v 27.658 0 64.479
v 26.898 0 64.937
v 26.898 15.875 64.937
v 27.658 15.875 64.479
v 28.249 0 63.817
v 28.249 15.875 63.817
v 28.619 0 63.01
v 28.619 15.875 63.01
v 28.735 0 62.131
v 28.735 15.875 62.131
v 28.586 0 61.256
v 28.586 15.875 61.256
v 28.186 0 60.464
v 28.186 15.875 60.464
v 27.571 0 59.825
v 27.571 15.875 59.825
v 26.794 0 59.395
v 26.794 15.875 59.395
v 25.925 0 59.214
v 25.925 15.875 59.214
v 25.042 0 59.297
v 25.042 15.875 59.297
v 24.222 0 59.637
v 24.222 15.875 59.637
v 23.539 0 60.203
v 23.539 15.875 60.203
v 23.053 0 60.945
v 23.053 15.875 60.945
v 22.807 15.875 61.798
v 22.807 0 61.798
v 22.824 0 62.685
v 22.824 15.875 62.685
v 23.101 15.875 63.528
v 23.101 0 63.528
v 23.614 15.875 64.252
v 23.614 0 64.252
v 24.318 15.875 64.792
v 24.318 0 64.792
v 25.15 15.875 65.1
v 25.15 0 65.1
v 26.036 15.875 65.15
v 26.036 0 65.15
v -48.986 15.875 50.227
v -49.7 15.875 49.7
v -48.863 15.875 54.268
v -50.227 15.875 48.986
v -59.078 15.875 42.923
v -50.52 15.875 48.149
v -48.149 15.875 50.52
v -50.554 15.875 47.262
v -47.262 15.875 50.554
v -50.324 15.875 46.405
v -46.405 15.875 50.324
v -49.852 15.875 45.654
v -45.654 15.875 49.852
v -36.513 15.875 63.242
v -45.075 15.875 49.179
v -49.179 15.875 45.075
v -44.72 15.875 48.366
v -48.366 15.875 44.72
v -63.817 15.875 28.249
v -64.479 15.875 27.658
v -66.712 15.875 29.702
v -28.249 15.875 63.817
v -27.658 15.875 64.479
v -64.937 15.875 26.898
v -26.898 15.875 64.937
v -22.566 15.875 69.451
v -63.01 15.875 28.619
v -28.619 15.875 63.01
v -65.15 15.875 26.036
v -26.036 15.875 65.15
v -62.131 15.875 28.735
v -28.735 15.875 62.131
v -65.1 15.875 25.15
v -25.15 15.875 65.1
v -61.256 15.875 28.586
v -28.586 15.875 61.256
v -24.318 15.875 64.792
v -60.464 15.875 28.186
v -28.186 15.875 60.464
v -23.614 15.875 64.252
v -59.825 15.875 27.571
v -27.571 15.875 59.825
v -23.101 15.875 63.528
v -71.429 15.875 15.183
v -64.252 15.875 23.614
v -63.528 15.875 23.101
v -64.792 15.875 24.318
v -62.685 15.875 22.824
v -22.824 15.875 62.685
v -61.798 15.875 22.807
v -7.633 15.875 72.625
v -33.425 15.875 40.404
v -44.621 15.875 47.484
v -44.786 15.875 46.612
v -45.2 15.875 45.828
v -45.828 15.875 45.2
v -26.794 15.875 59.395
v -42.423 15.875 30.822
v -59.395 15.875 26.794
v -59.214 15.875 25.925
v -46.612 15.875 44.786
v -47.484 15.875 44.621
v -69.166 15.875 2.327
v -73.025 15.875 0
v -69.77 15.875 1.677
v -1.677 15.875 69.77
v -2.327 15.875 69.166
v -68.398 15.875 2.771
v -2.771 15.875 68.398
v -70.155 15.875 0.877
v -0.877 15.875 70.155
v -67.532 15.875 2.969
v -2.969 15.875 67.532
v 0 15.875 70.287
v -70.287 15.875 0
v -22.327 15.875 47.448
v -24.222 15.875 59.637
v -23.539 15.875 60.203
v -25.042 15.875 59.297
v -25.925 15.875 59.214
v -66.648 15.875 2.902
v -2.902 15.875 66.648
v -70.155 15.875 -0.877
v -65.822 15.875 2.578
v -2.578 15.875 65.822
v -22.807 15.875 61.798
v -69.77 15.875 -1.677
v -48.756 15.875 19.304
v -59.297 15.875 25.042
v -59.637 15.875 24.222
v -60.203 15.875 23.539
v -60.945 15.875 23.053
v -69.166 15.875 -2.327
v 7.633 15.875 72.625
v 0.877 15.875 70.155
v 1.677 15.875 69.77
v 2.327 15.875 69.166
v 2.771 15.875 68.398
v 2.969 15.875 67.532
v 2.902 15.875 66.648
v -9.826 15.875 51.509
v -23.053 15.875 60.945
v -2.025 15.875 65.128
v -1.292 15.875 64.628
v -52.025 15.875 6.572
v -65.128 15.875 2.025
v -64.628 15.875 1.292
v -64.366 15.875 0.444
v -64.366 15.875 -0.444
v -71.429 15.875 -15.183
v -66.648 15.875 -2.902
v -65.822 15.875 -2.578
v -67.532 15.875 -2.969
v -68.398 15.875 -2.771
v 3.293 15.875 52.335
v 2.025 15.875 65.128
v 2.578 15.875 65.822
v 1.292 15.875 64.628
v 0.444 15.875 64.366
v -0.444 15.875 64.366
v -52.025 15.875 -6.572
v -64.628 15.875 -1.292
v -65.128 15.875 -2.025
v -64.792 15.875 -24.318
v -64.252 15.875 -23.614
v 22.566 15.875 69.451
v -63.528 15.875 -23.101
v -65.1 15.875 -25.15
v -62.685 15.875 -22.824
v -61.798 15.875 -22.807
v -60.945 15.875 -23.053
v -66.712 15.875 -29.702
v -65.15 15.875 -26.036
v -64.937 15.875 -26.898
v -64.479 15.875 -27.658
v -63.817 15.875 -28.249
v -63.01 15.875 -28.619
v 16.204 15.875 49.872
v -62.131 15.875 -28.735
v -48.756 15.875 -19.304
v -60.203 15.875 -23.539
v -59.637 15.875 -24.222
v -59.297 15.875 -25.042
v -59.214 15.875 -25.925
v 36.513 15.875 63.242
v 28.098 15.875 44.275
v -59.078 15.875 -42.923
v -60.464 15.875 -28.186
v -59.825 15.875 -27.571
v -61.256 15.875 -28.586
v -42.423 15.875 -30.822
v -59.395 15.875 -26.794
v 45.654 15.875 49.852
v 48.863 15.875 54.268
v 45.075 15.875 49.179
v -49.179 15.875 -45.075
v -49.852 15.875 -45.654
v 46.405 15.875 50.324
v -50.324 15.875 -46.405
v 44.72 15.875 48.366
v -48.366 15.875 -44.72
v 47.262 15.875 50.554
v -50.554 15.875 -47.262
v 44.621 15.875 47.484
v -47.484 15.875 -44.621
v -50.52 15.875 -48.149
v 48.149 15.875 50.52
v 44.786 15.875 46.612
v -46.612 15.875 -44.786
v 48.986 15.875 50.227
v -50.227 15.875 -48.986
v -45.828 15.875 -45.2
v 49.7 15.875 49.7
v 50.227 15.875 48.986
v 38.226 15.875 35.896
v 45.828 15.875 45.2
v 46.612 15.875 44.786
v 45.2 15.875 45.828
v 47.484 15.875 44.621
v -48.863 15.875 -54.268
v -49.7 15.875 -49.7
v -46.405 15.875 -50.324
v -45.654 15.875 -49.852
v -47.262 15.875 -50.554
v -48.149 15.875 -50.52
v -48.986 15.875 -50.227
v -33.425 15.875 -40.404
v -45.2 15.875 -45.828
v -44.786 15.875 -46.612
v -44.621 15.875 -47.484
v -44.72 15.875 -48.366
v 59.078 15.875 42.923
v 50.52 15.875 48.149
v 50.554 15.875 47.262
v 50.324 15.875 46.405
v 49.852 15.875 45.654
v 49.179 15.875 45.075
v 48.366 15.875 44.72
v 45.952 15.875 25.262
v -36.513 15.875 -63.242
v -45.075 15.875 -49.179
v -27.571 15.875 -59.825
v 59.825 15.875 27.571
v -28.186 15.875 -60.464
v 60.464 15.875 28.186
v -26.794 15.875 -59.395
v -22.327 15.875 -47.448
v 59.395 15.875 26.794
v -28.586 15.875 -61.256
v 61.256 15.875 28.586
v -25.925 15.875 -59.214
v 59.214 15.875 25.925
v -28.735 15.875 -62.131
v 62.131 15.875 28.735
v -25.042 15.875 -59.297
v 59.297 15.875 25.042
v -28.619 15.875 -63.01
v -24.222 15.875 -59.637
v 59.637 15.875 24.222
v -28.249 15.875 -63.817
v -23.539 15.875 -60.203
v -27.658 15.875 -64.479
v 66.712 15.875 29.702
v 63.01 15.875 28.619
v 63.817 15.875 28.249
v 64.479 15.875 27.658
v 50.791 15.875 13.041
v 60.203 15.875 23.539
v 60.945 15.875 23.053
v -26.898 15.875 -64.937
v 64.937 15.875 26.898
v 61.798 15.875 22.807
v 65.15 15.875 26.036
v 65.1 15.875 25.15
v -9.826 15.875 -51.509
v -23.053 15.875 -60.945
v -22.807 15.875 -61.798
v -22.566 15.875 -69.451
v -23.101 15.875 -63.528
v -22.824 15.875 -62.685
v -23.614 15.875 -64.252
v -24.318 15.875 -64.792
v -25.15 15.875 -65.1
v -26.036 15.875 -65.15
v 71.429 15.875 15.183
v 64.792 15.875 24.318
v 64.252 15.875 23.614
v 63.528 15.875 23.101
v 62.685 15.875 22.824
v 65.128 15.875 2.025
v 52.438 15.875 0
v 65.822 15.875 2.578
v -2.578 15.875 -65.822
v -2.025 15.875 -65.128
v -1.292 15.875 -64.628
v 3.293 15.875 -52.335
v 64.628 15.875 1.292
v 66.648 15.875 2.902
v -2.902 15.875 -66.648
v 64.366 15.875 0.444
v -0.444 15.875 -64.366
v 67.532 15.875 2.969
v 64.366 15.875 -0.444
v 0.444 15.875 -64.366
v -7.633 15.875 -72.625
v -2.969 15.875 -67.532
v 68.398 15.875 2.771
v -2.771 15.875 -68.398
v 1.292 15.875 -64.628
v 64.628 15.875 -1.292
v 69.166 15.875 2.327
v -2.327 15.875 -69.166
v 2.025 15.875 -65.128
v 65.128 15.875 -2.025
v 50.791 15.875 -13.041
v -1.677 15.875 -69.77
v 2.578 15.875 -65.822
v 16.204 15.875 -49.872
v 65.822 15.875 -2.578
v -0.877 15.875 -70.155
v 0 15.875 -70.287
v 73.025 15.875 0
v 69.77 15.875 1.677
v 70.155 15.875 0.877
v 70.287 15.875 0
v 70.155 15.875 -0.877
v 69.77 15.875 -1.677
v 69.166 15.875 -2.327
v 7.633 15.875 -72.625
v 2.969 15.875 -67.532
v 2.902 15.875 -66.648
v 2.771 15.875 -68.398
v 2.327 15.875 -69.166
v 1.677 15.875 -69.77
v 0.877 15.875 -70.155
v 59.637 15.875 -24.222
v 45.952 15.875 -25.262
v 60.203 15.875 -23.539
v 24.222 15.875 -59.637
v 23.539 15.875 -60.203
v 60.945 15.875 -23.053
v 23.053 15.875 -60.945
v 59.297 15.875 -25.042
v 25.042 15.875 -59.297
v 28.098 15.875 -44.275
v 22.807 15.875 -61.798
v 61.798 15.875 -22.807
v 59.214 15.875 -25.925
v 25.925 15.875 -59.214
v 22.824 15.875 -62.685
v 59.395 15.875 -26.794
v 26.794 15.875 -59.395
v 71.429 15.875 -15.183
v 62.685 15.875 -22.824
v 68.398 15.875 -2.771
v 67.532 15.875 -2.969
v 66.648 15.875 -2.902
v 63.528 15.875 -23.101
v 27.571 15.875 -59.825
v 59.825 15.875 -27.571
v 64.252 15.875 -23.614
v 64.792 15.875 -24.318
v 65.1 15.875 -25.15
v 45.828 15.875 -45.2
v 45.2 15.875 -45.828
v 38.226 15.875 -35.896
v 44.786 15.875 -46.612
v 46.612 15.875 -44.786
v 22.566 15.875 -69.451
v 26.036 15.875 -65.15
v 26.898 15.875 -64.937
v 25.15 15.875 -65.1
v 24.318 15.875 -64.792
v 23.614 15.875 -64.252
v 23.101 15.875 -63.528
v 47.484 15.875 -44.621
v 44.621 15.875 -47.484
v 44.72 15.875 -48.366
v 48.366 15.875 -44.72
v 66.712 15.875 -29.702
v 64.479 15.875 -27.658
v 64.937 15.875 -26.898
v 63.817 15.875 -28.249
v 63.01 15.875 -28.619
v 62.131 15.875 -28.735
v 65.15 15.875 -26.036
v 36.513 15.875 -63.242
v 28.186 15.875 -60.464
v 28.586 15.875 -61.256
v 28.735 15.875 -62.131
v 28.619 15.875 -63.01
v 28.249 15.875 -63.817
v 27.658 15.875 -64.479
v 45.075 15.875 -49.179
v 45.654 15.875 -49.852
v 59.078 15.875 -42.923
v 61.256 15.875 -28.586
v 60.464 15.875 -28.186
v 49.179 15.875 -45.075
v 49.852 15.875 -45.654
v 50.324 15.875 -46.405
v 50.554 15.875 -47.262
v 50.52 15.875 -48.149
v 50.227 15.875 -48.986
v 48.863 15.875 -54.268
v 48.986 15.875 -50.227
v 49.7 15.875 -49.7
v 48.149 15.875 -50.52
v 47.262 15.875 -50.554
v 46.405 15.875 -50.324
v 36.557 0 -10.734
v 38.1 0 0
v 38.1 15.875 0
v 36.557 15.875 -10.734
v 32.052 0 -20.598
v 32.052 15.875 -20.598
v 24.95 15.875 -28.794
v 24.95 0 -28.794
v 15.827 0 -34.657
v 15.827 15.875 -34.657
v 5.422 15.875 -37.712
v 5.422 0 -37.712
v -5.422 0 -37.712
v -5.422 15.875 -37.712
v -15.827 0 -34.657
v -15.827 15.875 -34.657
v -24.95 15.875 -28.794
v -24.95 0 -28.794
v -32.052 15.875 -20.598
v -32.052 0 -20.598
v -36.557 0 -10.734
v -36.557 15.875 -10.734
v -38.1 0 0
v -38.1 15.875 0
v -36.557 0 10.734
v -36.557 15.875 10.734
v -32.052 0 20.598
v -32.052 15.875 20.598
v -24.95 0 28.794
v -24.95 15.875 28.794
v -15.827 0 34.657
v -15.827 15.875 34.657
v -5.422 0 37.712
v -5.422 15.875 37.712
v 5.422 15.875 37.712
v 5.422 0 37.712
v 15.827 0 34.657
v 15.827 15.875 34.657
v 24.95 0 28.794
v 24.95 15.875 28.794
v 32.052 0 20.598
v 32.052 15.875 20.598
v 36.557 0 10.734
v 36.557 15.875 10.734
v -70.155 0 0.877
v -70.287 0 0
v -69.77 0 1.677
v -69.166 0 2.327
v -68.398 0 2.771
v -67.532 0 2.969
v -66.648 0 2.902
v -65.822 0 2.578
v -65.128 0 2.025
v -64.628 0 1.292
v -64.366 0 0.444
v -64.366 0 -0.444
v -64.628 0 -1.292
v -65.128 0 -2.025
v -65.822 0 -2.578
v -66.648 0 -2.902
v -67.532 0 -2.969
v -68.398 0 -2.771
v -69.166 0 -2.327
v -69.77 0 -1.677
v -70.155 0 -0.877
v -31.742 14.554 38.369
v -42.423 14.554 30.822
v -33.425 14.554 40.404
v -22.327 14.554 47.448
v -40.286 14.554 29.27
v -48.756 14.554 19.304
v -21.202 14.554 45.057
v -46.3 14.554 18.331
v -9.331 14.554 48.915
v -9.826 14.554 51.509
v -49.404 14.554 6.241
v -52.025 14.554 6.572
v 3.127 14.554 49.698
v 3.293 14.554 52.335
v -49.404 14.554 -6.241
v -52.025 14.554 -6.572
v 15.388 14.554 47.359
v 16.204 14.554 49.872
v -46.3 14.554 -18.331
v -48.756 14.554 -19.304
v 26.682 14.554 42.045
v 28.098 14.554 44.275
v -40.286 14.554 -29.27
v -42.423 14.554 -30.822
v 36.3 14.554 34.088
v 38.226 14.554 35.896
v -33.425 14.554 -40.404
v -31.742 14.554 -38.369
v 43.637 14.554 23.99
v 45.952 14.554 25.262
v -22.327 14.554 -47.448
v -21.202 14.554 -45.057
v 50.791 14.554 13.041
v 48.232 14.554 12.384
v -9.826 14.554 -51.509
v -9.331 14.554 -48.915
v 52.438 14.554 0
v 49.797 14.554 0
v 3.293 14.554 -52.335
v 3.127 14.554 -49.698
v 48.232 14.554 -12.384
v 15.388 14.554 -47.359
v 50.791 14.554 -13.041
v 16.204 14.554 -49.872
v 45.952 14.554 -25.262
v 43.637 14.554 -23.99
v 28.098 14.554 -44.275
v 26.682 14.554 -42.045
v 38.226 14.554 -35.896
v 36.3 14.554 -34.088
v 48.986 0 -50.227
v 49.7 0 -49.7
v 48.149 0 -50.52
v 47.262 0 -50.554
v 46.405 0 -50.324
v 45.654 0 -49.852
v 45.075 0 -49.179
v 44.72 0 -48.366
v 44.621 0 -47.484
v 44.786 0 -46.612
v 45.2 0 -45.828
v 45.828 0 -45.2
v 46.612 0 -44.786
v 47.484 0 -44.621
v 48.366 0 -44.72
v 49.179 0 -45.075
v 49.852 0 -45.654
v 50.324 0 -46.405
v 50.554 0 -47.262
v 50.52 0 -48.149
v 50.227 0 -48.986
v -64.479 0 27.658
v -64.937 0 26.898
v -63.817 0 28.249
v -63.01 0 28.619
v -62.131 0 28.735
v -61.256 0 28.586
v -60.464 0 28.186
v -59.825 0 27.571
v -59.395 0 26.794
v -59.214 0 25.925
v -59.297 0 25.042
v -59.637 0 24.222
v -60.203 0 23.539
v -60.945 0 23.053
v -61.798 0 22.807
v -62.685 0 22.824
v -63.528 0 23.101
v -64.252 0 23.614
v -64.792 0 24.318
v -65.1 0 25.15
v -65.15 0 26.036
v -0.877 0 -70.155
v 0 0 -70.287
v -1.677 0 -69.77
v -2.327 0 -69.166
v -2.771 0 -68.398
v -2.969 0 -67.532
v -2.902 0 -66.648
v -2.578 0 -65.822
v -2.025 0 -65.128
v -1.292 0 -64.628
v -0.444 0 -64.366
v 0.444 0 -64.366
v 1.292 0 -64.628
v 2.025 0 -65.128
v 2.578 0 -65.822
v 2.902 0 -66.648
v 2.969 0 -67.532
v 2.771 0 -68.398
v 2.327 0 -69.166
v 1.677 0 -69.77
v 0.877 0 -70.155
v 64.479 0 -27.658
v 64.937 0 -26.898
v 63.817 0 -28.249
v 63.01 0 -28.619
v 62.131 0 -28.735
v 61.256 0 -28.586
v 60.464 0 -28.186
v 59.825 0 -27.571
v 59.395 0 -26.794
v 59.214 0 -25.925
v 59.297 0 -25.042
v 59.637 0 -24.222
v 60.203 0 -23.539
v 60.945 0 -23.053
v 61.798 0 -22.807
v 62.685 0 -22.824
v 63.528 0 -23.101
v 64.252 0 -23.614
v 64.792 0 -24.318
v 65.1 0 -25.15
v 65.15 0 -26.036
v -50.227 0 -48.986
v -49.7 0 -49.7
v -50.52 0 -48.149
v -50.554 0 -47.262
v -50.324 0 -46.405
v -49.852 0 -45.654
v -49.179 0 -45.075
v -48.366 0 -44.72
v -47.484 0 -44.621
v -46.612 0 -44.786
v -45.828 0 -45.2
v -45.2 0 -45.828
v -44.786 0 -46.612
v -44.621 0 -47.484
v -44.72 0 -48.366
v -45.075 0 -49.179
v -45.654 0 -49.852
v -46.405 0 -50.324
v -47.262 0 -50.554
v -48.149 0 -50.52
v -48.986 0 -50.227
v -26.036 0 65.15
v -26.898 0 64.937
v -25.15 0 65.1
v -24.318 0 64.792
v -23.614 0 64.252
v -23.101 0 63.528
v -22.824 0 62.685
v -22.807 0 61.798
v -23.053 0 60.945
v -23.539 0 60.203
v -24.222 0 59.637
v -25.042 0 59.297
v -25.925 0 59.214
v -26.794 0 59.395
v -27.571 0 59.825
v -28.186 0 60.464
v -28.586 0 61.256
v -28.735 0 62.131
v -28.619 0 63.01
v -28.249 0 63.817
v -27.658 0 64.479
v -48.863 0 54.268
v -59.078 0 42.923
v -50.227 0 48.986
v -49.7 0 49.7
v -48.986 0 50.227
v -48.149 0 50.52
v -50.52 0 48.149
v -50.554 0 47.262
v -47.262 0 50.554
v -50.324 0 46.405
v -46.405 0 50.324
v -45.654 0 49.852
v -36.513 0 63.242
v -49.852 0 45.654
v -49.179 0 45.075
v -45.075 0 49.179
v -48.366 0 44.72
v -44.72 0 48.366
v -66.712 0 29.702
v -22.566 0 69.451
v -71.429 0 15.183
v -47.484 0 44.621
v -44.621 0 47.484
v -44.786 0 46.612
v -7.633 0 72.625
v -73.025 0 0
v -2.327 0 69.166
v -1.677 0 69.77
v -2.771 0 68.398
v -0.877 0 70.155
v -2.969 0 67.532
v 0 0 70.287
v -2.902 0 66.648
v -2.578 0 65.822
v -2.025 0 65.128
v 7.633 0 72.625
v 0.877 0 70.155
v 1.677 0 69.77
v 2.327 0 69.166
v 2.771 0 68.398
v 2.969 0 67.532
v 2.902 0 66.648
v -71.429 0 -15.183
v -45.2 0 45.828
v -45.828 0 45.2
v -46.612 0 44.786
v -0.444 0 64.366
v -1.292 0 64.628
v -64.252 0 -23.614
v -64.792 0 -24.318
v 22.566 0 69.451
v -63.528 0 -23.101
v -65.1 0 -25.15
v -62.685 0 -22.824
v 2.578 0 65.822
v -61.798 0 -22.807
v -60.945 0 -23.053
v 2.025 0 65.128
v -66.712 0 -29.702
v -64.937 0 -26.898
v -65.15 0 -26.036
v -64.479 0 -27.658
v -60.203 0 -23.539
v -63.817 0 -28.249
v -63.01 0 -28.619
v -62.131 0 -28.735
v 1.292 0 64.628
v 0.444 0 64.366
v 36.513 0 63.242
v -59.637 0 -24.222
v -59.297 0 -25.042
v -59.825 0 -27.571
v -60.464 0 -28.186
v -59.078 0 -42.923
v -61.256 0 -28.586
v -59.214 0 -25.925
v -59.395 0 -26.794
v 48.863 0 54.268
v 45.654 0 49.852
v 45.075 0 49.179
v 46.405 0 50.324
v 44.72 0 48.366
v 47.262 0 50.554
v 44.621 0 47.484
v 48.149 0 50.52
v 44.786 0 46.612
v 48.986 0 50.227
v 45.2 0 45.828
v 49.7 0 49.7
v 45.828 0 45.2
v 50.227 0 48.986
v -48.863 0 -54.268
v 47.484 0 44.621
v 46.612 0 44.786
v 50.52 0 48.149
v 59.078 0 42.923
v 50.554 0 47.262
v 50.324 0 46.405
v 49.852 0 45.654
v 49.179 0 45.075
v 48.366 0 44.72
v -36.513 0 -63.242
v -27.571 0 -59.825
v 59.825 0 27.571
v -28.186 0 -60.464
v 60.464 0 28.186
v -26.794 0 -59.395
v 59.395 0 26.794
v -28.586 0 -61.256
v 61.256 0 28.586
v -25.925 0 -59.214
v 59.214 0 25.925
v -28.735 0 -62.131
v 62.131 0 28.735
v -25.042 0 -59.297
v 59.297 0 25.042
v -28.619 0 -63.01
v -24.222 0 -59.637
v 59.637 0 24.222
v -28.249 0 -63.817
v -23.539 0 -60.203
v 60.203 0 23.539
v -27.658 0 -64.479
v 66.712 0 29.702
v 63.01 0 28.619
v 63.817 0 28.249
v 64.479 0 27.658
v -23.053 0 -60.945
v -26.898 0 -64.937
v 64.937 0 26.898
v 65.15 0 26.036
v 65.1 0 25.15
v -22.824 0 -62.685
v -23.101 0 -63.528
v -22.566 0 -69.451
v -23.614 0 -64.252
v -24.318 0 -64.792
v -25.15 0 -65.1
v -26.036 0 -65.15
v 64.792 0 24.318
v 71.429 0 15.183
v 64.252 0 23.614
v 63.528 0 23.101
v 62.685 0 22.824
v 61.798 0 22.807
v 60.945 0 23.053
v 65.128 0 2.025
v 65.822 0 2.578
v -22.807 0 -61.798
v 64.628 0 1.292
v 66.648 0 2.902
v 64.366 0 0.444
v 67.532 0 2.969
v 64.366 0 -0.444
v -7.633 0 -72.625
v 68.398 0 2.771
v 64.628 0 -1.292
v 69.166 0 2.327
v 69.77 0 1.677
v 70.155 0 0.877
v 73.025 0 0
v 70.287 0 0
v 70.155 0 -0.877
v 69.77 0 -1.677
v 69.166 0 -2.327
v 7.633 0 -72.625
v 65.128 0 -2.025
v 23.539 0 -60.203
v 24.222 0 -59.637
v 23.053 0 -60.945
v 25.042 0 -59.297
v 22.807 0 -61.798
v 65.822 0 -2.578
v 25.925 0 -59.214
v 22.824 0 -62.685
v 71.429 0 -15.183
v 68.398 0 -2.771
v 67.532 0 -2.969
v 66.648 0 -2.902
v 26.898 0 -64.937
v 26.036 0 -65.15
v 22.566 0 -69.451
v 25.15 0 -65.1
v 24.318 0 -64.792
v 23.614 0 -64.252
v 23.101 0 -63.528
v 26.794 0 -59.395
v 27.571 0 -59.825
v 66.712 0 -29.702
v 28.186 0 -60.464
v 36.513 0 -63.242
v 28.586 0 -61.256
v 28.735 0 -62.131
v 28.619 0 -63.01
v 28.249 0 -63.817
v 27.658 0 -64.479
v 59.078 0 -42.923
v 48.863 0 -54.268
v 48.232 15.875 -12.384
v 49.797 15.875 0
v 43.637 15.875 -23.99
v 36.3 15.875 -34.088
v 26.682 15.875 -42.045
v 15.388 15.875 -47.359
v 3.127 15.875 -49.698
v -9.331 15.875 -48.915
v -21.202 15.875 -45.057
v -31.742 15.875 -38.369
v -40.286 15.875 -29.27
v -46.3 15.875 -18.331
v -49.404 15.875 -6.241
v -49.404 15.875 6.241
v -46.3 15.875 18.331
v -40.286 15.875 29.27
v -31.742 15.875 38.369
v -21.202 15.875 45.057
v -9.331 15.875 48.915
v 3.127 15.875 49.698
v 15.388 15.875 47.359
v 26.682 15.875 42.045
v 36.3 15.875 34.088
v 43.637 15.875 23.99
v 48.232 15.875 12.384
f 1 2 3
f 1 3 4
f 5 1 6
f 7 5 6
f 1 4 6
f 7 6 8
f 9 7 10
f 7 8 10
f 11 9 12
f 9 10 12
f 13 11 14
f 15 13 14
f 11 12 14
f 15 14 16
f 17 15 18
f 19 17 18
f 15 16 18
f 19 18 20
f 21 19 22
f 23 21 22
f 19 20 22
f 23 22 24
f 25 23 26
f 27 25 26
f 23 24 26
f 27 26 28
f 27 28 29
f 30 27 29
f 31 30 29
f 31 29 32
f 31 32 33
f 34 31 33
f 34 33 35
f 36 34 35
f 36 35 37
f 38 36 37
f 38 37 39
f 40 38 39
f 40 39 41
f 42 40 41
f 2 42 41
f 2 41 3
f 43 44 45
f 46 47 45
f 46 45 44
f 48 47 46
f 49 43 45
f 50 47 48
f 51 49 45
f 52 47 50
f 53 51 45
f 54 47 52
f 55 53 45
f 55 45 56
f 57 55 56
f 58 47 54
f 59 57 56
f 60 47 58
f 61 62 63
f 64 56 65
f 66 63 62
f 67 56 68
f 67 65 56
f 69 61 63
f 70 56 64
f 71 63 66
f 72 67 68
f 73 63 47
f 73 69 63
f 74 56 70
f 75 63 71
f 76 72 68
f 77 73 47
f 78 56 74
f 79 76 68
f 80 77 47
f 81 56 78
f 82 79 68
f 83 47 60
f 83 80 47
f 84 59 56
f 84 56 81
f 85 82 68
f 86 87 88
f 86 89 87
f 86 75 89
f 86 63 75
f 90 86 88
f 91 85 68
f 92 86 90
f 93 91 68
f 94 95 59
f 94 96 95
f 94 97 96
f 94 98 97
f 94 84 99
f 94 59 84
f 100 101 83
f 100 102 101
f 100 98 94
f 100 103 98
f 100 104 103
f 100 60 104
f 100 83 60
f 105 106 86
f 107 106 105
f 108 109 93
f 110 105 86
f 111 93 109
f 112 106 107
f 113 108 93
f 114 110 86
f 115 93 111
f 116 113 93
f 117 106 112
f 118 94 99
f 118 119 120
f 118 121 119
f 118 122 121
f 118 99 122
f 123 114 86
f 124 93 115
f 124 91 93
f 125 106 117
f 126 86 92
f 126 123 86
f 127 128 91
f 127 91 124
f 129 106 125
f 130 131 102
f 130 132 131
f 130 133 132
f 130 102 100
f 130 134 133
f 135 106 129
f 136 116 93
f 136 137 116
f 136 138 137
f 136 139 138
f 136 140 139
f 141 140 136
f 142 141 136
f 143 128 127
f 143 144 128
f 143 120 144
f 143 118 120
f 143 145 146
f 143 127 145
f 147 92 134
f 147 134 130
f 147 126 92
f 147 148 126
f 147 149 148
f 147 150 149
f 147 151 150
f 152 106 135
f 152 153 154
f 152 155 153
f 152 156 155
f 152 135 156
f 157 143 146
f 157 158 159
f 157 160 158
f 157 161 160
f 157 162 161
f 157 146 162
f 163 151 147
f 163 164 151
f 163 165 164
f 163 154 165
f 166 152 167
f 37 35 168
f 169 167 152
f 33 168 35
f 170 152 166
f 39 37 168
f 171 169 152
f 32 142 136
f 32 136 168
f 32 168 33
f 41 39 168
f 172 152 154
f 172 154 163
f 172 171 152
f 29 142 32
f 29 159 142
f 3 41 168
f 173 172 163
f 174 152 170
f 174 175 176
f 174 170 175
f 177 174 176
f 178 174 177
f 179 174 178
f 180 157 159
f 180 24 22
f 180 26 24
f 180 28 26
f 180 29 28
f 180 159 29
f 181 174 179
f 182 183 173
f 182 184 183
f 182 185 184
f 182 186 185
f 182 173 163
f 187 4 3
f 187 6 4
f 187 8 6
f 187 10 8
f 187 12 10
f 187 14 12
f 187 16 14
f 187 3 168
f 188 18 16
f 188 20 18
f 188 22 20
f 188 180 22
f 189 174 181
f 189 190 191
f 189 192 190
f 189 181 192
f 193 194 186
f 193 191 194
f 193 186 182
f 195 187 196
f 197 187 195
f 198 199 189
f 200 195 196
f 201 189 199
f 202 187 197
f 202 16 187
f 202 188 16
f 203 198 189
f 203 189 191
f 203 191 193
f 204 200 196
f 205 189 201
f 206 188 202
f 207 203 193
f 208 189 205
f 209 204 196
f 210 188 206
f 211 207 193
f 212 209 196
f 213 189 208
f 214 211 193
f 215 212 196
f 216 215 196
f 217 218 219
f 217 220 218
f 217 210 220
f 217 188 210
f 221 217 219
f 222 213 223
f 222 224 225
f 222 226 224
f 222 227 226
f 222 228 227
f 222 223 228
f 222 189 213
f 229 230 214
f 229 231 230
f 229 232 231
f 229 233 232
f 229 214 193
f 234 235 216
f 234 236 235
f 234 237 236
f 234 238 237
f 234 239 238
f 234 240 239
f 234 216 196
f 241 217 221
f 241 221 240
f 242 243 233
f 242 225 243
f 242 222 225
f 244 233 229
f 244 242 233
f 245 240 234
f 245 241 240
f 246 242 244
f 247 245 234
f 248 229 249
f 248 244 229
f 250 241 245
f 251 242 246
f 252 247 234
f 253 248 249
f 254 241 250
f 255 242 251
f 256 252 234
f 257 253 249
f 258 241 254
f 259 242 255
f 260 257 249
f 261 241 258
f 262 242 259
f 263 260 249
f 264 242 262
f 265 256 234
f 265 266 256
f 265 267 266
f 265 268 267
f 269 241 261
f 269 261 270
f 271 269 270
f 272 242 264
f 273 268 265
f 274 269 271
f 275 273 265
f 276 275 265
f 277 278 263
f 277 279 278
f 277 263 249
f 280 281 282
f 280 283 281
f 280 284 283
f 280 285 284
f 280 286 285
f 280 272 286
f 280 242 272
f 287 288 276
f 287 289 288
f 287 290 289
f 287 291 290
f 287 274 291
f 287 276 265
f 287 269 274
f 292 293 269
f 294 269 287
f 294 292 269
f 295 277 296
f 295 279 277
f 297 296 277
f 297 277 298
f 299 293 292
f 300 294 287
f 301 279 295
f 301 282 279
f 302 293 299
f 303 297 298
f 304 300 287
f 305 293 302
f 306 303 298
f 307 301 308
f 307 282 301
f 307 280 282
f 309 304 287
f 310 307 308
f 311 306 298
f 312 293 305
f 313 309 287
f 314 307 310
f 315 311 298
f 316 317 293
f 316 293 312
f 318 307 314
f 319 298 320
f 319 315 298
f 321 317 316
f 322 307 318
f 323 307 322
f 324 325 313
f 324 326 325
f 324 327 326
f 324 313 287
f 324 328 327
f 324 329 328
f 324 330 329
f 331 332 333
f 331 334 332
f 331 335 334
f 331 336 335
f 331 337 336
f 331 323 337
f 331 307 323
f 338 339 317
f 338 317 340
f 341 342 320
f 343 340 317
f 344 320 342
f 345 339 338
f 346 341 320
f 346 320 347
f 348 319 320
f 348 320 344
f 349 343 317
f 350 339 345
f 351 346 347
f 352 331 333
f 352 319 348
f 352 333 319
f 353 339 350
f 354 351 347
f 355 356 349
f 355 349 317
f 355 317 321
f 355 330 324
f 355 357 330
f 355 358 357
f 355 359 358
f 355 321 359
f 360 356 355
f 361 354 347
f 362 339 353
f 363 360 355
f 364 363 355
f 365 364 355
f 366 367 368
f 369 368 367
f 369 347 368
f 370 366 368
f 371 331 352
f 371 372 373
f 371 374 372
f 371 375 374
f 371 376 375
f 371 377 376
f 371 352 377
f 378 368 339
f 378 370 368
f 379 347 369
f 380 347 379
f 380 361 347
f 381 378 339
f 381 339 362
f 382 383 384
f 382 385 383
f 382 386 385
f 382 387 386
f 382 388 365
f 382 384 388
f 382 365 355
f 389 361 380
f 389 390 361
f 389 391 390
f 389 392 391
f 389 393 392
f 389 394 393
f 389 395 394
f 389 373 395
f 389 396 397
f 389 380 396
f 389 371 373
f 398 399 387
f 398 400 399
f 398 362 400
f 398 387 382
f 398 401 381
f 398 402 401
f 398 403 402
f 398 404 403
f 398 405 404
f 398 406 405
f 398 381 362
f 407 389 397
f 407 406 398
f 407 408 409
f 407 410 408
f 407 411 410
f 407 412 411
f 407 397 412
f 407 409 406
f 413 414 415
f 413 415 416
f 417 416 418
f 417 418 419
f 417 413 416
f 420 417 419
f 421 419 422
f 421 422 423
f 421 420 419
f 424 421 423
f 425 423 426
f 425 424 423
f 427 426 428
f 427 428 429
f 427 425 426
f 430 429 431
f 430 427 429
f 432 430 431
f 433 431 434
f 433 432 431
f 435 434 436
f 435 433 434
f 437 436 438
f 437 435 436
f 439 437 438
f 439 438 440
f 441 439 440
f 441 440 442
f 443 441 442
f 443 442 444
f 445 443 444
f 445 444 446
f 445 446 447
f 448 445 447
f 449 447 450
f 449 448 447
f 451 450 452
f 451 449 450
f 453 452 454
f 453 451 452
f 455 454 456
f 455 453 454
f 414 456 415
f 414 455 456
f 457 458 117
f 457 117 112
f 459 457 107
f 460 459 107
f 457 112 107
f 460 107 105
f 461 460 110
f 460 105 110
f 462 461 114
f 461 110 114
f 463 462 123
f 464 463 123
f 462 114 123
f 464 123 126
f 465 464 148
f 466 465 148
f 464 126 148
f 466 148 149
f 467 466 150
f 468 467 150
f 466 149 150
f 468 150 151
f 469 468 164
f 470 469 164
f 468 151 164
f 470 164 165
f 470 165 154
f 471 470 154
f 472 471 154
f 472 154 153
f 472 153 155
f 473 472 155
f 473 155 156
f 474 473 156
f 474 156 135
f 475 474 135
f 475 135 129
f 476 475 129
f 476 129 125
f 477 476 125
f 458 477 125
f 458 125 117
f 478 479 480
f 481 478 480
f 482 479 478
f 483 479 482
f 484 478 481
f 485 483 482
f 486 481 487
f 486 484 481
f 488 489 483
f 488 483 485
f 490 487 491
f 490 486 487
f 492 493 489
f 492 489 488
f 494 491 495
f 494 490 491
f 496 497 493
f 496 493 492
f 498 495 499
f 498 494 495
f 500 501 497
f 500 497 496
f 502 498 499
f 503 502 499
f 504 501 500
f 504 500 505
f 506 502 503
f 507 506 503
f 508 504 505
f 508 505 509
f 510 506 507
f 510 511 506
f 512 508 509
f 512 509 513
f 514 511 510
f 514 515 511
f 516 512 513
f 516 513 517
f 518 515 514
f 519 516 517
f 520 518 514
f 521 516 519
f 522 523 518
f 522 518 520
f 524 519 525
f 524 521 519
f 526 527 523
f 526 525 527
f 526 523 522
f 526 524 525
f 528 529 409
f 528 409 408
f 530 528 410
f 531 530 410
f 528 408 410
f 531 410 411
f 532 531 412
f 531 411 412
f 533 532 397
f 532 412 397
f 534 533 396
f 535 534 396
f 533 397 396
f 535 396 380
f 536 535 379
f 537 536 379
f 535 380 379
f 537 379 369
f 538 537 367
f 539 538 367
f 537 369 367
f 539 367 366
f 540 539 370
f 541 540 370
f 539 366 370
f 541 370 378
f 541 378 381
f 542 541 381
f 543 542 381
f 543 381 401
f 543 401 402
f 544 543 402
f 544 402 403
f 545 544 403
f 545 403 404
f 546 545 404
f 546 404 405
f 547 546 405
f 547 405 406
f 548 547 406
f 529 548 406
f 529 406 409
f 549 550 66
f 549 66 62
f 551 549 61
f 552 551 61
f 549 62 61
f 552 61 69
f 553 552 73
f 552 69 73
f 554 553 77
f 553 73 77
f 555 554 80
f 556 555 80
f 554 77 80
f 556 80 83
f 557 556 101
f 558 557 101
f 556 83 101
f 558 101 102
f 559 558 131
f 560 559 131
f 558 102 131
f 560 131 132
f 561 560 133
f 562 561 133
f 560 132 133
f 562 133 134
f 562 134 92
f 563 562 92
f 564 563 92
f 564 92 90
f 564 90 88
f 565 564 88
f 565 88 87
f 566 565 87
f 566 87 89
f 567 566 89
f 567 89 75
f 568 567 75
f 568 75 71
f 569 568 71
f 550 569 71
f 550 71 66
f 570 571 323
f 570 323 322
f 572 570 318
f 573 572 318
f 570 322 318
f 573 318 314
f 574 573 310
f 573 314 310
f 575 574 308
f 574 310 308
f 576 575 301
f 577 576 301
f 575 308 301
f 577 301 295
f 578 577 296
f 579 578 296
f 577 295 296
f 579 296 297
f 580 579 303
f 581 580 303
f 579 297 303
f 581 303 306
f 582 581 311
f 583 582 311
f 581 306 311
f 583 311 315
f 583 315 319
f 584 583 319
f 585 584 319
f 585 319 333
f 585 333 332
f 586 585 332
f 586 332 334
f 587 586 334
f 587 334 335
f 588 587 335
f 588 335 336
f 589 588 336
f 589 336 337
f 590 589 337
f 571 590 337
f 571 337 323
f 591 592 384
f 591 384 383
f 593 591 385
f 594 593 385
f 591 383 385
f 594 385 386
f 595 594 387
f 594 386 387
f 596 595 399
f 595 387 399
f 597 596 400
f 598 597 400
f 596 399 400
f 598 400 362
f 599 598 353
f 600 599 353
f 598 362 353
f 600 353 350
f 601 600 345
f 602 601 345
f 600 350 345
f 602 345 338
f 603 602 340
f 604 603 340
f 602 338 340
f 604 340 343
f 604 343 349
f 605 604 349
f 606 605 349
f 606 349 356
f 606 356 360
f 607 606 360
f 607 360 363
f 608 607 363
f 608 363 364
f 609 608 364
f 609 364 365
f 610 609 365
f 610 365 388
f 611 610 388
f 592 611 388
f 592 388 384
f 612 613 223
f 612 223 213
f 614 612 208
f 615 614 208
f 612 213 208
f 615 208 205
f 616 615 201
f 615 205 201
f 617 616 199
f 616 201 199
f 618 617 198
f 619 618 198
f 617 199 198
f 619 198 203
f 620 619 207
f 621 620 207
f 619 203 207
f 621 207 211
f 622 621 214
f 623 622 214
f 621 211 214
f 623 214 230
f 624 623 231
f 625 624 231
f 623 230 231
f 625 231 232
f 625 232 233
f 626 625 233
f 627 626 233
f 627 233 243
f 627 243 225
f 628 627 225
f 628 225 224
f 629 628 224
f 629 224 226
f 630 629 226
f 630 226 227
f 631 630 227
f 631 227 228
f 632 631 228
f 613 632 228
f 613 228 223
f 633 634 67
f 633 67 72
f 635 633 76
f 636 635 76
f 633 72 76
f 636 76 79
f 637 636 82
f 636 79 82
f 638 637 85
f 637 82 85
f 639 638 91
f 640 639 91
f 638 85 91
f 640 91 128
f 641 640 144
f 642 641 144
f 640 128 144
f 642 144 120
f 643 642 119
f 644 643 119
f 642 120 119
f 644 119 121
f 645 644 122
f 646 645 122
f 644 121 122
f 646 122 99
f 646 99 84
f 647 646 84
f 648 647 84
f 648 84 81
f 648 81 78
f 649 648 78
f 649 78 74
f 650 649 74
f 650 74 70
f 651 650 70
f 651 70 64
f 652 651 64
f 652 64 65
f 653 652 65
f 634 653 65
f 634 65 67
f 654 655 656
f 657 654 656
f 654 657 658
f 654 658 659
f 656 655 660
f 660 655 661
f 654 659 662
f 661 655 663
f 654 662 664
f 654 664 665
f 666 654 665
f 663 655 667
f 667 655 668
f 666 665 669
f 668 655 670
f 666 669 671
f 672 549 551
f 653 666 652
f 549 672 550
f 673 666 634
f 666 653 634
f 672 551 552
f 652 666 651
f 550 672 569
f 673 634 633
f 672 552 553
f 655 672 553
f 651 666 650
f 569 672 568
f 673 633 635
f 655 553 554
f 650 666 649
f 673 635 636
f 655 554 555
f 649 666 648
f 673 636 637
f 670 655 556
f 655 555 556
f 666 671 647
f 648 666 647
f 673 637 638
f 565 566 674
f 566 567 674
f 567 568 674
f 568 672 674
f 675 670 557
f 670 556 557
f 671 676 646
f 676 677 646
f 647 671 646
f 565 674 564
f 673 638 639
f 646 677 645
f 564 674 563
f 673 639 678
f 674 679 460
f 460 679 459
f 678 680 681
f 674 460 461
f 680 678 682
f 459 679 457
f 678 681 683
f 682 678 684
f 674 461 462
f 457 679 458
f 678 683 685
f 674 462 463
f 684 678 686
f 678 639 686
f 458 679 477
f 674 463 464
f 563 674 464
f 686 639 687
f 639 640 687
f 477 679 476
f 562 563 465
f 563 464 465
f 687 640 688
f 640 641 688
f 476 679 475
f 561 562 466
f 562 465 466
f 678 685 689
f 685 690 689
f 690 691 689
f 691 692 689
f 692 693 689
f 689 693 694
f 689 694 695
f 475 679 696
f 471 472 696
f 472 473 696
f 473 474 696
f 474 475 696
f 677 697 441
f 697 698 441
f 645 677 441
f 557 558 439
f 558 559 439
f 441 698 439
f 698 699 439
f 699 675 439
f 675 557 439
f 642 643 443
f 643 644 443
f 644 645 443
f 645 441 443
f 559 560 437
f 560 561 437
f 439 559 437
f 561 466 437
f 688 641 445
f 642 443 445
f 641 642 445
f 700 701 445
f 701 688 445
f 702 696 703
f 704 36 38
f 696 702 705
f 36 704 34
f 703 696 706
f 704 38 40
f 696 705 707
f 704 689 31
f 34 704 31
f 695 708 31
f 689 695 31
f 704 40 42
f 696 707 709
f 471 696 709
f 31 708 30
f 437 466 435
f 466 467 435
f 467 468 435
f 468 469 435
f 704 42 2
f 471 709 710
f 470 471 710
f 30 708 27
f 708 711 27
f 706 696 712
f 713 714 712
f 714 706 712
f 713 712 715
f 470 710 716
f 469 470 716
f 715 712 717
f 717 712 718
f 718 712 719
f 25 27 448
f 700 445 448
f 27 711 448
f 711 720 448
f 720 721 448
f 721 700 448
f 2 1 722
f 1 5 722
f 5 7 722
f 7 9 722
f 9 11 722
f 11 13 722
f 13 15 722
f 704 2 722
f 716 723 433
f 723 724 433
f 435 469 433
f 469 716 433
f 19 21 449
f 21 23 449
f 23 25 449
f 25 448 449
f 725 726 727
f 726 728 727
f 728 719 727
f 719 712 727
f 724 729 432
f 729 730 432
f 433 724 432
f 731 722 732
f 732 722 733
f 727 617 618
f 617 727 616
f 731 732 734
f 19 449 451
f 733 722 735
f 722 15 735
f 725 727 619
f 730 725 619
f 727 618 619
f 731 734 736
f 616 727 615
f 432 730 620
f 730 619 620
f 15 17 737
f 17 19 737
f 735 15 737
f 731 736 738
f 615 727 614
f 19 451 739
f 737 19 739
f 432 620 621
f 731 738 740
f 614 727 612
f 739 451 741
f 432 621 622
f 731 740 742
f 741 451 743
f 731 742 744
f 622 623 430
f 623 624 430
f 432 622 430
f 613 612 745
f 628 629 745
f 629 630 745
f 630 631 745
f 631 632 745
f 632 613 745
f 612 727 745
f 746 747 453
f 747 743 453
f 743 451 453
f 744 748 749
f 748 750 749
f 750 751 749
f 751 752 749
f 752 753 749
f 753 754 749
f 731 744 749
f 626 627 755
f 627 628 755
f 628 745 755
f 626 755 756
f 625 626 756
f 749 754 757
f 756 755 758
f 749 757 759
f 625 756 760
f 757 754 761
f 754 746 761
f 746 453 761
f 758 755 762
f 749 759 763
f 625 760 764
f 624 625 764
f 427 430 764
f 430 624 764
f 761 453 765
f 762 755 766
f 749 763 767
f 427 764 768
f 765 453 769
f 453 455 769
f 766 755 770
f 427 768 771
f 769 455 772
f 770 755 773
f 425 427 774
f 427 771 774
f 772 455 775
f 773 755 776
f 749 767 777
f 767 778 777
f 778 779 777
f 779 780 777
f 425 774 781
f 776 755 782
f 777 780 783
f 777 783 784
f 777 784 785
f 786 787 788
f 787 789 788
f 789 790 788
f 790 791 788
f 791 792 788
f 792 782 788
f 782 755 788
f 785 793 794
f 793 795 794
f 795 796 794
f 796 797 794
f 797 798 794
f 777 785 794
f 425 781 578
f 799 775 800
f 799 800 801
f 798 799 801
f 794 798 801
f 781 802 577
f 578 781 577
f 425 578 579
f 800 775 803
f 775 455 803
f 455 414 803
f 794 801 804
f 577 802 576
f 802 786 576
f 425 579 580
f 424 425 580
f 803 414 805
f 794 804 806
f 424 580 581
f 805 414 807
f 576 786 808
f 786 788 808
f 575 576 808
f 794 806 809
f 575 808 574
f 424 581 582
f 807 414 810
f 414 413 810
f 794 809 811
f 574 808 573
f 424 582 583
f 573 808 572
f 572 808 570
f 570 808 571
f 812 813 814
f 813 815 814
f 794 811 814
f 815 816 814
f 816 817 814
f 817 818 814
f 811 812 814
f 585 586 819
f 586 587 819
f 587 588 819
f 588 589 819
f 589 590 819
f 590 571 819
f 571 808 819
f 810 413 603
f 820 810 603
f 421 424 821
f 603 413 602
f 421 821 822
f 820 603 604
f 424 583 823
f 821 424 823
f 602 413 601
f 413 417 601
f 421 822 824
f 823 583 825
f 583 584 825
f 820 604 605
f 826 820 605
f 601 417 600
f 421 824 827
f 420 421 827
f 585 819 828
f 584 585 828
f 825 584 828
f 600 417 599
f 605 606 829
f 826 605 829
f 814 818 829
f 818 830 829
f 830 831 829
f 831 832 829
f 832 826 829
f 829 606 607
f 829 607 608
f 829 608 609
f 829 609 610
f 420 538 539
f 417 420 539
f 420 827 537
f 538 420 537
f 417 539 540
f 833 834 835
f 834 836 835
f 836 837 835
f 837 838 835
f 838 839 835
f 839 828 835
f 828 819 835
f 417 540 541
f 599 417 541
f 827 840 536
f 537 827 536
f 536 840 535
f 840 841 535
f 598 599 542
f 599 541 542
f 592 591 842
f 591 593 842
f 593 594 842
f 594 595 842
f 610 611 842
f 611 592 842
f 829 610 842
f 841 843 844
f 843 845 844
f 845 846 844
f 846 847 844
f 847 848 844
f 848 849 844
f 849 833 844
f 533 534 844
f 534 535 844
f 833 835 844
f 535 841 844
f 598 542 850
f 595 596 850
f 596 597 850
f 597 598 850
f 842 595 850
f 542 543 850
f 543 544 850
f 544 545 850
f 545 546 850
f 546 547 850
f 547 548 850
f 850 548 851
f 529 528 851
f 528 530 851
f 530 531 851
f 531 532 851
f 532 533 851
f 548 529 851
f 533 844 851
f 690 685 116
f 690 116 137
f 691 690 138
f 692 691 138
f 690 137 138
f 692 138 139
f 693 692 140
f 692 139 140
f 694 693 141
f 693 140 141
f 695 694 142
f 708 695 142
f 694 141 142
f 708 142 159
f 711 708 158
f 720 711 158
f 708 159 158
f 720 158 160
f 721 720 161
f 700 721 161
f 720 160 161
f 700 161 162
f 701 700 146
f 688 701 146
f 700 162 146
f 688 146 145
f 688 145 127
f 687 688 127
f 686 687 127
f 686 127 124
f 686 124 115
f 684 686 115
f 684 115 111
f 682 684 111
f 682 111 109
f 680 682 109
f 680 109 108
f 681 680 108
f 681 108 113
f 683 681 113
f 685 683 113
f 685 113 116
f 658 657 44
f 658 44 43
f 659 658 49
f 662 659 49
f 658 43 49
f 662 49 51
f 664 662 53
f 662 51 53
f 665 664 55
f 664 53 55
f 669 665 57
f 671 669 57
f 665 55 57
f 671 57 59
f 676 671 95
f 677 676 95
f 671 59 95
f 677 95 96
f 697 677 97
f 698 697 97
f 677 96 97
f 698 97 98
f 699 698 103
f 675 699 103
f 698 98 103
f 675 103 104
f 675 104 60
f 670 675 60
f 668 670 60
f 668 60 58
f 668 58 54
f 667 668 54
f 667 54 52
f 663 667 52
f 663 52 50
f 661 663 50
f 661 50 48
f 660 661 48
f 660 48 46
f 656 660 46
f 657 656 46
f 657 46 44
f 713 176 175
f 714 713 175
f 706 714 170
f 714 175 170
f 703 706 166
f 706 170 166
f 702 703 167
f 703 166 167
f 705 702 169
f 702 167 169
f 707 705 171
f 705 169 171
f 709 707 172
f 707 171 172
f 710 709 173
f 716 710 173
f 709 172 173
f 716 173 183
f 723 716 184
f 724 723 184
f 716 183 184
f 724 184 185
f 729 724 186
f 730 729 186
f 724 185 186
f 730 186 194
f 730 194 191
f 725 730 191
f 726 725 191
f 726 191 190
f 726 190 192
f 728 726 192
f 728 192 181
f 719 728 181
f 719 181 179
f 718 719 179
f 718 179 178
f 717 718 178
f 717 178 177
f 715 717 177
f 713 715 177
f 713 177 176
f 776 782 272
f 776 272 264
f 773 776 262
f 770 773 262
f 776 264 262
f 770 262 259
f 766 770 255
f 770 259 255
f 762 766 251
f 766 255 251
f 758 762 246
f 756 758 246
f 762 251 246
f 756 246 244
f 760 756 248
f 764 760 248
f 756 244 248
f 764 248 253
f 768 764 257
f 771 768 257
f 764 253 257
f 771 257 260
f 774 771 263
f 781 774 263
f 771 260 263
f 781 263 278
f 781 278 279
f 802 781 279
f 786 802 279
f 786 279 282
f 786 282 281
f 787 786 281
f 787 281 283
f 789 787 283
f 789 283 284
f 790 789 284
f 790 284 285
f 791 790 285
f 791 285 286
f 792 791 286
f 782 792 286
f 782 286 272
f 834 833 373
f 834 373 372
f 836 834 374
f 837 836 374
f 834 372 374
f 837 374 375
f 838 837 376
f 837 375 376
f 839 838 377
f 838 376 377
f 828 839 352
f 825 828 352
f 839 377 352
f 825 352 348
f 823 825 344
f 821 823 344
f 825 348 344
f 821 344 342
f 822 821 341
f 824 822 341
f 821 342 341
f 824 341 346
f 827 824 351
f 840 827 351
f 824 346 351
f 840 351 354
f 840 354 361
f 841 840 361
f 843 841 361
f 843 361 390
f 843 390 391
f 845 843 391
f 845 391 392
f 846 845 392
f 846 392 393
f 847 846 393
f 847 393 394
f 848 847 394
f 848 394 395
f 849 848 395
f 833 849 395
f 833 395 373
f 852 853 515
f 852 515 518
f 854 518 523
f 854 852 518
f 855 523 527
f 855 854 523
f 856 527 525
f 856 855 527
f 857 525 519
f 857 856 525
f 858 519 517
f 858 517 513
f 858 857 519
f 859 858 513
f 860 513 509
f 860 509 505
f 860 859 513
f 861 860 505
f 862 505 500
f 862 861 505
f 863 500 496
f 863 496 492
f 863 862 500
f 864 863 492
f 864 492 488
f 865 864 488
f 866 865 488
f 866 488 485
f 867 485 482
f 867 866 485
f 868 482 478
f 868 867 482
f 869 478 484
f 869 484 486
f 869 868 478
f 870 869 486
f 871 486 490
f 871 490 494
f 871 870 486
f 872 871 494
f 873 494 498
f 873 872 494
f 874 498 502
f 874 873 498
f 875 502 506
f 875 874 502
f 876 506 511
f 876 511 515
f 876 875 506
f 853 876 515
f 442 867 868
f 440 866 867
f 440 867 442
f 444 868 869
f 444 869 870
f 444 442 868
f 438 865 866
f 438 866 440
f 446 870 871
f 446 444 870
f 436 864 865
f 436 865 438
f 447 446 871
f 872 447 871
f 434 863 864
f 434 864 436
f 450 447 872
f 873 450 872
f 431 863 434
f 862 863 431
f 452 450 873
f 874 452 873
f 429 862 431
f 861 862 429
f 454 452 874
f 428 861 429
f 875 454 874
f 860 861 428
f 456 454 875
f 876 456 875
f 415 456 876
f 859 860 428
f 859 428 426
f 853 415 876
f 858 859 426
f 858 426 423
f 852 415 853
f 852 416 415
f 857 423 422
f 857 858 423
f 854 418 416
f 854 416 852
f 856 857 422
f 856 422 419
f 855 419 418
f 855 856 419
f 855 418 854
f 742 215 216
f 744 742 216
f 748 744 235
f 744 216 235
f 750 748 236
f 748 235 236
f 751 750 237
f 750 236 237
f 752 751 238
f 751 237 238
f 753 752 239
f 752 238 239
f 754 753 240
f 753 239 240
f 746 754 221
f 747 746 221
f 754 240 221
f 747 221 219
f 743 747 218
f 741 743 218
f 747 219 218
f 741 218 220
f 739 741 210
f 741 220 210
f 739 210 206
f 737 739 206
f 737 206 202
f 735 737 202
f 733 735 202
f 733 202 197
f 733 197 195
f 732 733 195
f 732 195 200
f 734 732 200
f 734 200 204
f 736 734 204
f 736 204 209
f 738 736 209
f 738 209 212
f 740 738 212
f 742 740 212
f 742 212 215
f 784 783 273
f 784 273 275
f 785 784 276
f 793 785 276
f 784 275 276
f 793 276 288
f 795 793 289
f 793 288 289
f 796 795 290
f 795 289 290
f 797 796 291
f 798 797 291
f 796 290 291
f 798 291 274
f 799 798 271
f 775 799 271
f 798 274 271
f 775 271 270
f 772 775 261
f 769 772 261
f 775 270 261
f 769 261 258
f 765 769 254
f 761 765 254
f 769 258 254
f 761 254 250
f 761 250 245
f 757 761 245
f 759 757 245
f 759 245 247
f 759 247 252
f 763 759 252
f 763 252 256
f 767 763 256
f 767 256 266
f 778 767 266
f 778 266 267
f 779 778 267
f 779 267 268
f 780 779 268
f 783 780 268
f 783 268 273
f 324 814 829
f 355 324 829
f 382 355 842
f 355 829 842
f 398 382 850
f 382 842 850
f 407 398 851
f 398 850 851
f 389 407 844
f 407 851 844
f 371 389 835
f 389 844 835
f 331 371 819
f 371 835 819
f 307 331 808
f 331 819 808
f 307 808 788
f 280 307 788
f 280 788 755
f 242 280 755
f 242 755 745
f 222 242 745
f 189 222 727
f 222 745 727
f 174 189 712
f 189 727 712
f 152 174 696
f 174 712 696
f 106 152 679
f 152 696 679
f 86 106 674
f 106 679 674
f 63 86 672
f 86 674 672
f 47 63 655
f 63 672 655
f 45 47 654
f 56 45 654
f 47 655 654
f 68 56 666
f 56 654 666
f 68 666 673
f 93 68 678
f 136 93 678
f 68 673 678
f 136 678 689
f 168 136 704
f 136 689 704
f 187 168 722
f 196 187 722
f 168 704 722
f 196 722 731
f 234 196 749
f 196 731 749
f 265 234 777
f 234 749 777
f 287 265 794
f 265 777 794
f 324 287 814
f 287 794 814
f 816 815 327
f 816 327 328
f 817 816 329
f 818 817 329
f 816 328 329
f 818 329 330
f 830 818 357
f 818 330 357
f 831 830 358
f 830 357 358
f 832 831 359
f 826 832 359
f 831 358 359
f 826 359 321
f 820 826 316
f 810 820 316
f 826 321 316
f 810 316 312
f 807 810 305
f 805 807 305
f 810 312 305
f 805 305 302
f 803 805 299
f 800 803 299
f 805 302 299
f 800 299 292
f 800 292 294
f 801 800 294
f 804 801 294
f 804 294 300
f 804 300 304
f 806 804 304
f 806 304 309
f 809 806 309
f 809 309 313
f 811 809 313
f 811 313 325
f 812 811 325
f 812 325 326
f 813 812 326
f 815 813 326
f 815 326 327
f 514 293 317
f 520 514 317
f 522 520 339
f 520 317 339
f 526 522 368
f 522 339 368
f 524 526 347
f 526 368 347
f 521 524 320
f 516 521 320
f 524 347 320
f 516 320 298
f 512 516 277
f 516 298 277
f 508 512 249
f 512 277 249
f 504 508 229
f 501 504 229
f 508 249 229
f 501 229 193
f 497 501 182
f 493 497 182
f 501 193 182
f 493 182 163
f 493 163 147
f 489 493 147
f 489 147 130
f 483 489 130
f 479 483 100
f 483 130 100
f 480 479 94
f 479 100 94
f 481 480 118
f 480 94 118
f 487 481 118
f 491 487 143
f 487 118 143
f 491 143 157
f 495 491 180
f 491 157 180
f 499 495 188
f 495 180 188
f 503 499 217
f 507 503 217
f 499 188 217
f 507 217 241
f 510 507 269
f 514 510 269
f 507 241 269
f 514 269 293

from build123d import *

# Parameters (mm, degrees)
SKETCH1_R           = 73.025
SKETCH1_R_2         = 38.1
BOSS_EXTRUDE1_DEPTH = 15.875
SKETCH2_R           = 2.97688
CUT_EXTRUDE1_DEPTH  = 16.875
CIRPATTERN1_COUNT   = 16
SKETCH3_R           = 52.4383
SKETCH3_R_2         = 49.7967
CUT_EXTRUDE2_DEPTH  = 1.3208


with BuildPart() as part:
    # Sketch1 → Boss-Extrude1 (new body)
    with BuildSketch(Plane(origin=(0, 0, 0), x_dir=(1, 0, 0), z_dir=(0, 1, 0))):
        Circle(SKETCH1_R)
        Circle(SKETCH1_R_2, mode=Mode.SUBTRACT)
    extrude(amount=BOSS_EXTRUDE1_DEPTH)

    # Sketch2 → Cut-Extrude1 (cut, through all)
    with BuildSketch(Plane(origin=(0, 15.875, 0), x_dir=(1, 0, 0), z_dir=(0, 1, 0))):
        with Locations((67.31, 0)):
            Circle(SKETCH2_R)
    cut_extrude1 = extrude(amount=-CUT_EXTRUDE1_DEPTH, mode=Mode.SUBTRACT)

    # CirPattern1: Cut-Extrude1 ×16 about axis
    cirpattern1_axis = Axis((0, 0, 0), (0, 1, 0))
    for i in range(1, CIRPATTERN1_COUNT):
        add(cut_extrude1.rotate(cirpattern1_axis, i * 360 / CIRPATTERN1_COUNT), mode=Mode.SUBTRACT)

    # Sketch3 → Cut-Extrude2 (cut)
    with BuildSketch(Plane(origin=(0, 15.875, 0), x_dir=(1, 0, 0), z_dir=(0, 1, 0))):
        Circle(SKETCH3_R)
        Circle(SKETCH3_R_2, mode=Mode.SUBTRACT)
    extrude(amount=-CUT_EXTRUDE2_DEPTH, mode=Mode.SUBTRACT)


solid = part.part
